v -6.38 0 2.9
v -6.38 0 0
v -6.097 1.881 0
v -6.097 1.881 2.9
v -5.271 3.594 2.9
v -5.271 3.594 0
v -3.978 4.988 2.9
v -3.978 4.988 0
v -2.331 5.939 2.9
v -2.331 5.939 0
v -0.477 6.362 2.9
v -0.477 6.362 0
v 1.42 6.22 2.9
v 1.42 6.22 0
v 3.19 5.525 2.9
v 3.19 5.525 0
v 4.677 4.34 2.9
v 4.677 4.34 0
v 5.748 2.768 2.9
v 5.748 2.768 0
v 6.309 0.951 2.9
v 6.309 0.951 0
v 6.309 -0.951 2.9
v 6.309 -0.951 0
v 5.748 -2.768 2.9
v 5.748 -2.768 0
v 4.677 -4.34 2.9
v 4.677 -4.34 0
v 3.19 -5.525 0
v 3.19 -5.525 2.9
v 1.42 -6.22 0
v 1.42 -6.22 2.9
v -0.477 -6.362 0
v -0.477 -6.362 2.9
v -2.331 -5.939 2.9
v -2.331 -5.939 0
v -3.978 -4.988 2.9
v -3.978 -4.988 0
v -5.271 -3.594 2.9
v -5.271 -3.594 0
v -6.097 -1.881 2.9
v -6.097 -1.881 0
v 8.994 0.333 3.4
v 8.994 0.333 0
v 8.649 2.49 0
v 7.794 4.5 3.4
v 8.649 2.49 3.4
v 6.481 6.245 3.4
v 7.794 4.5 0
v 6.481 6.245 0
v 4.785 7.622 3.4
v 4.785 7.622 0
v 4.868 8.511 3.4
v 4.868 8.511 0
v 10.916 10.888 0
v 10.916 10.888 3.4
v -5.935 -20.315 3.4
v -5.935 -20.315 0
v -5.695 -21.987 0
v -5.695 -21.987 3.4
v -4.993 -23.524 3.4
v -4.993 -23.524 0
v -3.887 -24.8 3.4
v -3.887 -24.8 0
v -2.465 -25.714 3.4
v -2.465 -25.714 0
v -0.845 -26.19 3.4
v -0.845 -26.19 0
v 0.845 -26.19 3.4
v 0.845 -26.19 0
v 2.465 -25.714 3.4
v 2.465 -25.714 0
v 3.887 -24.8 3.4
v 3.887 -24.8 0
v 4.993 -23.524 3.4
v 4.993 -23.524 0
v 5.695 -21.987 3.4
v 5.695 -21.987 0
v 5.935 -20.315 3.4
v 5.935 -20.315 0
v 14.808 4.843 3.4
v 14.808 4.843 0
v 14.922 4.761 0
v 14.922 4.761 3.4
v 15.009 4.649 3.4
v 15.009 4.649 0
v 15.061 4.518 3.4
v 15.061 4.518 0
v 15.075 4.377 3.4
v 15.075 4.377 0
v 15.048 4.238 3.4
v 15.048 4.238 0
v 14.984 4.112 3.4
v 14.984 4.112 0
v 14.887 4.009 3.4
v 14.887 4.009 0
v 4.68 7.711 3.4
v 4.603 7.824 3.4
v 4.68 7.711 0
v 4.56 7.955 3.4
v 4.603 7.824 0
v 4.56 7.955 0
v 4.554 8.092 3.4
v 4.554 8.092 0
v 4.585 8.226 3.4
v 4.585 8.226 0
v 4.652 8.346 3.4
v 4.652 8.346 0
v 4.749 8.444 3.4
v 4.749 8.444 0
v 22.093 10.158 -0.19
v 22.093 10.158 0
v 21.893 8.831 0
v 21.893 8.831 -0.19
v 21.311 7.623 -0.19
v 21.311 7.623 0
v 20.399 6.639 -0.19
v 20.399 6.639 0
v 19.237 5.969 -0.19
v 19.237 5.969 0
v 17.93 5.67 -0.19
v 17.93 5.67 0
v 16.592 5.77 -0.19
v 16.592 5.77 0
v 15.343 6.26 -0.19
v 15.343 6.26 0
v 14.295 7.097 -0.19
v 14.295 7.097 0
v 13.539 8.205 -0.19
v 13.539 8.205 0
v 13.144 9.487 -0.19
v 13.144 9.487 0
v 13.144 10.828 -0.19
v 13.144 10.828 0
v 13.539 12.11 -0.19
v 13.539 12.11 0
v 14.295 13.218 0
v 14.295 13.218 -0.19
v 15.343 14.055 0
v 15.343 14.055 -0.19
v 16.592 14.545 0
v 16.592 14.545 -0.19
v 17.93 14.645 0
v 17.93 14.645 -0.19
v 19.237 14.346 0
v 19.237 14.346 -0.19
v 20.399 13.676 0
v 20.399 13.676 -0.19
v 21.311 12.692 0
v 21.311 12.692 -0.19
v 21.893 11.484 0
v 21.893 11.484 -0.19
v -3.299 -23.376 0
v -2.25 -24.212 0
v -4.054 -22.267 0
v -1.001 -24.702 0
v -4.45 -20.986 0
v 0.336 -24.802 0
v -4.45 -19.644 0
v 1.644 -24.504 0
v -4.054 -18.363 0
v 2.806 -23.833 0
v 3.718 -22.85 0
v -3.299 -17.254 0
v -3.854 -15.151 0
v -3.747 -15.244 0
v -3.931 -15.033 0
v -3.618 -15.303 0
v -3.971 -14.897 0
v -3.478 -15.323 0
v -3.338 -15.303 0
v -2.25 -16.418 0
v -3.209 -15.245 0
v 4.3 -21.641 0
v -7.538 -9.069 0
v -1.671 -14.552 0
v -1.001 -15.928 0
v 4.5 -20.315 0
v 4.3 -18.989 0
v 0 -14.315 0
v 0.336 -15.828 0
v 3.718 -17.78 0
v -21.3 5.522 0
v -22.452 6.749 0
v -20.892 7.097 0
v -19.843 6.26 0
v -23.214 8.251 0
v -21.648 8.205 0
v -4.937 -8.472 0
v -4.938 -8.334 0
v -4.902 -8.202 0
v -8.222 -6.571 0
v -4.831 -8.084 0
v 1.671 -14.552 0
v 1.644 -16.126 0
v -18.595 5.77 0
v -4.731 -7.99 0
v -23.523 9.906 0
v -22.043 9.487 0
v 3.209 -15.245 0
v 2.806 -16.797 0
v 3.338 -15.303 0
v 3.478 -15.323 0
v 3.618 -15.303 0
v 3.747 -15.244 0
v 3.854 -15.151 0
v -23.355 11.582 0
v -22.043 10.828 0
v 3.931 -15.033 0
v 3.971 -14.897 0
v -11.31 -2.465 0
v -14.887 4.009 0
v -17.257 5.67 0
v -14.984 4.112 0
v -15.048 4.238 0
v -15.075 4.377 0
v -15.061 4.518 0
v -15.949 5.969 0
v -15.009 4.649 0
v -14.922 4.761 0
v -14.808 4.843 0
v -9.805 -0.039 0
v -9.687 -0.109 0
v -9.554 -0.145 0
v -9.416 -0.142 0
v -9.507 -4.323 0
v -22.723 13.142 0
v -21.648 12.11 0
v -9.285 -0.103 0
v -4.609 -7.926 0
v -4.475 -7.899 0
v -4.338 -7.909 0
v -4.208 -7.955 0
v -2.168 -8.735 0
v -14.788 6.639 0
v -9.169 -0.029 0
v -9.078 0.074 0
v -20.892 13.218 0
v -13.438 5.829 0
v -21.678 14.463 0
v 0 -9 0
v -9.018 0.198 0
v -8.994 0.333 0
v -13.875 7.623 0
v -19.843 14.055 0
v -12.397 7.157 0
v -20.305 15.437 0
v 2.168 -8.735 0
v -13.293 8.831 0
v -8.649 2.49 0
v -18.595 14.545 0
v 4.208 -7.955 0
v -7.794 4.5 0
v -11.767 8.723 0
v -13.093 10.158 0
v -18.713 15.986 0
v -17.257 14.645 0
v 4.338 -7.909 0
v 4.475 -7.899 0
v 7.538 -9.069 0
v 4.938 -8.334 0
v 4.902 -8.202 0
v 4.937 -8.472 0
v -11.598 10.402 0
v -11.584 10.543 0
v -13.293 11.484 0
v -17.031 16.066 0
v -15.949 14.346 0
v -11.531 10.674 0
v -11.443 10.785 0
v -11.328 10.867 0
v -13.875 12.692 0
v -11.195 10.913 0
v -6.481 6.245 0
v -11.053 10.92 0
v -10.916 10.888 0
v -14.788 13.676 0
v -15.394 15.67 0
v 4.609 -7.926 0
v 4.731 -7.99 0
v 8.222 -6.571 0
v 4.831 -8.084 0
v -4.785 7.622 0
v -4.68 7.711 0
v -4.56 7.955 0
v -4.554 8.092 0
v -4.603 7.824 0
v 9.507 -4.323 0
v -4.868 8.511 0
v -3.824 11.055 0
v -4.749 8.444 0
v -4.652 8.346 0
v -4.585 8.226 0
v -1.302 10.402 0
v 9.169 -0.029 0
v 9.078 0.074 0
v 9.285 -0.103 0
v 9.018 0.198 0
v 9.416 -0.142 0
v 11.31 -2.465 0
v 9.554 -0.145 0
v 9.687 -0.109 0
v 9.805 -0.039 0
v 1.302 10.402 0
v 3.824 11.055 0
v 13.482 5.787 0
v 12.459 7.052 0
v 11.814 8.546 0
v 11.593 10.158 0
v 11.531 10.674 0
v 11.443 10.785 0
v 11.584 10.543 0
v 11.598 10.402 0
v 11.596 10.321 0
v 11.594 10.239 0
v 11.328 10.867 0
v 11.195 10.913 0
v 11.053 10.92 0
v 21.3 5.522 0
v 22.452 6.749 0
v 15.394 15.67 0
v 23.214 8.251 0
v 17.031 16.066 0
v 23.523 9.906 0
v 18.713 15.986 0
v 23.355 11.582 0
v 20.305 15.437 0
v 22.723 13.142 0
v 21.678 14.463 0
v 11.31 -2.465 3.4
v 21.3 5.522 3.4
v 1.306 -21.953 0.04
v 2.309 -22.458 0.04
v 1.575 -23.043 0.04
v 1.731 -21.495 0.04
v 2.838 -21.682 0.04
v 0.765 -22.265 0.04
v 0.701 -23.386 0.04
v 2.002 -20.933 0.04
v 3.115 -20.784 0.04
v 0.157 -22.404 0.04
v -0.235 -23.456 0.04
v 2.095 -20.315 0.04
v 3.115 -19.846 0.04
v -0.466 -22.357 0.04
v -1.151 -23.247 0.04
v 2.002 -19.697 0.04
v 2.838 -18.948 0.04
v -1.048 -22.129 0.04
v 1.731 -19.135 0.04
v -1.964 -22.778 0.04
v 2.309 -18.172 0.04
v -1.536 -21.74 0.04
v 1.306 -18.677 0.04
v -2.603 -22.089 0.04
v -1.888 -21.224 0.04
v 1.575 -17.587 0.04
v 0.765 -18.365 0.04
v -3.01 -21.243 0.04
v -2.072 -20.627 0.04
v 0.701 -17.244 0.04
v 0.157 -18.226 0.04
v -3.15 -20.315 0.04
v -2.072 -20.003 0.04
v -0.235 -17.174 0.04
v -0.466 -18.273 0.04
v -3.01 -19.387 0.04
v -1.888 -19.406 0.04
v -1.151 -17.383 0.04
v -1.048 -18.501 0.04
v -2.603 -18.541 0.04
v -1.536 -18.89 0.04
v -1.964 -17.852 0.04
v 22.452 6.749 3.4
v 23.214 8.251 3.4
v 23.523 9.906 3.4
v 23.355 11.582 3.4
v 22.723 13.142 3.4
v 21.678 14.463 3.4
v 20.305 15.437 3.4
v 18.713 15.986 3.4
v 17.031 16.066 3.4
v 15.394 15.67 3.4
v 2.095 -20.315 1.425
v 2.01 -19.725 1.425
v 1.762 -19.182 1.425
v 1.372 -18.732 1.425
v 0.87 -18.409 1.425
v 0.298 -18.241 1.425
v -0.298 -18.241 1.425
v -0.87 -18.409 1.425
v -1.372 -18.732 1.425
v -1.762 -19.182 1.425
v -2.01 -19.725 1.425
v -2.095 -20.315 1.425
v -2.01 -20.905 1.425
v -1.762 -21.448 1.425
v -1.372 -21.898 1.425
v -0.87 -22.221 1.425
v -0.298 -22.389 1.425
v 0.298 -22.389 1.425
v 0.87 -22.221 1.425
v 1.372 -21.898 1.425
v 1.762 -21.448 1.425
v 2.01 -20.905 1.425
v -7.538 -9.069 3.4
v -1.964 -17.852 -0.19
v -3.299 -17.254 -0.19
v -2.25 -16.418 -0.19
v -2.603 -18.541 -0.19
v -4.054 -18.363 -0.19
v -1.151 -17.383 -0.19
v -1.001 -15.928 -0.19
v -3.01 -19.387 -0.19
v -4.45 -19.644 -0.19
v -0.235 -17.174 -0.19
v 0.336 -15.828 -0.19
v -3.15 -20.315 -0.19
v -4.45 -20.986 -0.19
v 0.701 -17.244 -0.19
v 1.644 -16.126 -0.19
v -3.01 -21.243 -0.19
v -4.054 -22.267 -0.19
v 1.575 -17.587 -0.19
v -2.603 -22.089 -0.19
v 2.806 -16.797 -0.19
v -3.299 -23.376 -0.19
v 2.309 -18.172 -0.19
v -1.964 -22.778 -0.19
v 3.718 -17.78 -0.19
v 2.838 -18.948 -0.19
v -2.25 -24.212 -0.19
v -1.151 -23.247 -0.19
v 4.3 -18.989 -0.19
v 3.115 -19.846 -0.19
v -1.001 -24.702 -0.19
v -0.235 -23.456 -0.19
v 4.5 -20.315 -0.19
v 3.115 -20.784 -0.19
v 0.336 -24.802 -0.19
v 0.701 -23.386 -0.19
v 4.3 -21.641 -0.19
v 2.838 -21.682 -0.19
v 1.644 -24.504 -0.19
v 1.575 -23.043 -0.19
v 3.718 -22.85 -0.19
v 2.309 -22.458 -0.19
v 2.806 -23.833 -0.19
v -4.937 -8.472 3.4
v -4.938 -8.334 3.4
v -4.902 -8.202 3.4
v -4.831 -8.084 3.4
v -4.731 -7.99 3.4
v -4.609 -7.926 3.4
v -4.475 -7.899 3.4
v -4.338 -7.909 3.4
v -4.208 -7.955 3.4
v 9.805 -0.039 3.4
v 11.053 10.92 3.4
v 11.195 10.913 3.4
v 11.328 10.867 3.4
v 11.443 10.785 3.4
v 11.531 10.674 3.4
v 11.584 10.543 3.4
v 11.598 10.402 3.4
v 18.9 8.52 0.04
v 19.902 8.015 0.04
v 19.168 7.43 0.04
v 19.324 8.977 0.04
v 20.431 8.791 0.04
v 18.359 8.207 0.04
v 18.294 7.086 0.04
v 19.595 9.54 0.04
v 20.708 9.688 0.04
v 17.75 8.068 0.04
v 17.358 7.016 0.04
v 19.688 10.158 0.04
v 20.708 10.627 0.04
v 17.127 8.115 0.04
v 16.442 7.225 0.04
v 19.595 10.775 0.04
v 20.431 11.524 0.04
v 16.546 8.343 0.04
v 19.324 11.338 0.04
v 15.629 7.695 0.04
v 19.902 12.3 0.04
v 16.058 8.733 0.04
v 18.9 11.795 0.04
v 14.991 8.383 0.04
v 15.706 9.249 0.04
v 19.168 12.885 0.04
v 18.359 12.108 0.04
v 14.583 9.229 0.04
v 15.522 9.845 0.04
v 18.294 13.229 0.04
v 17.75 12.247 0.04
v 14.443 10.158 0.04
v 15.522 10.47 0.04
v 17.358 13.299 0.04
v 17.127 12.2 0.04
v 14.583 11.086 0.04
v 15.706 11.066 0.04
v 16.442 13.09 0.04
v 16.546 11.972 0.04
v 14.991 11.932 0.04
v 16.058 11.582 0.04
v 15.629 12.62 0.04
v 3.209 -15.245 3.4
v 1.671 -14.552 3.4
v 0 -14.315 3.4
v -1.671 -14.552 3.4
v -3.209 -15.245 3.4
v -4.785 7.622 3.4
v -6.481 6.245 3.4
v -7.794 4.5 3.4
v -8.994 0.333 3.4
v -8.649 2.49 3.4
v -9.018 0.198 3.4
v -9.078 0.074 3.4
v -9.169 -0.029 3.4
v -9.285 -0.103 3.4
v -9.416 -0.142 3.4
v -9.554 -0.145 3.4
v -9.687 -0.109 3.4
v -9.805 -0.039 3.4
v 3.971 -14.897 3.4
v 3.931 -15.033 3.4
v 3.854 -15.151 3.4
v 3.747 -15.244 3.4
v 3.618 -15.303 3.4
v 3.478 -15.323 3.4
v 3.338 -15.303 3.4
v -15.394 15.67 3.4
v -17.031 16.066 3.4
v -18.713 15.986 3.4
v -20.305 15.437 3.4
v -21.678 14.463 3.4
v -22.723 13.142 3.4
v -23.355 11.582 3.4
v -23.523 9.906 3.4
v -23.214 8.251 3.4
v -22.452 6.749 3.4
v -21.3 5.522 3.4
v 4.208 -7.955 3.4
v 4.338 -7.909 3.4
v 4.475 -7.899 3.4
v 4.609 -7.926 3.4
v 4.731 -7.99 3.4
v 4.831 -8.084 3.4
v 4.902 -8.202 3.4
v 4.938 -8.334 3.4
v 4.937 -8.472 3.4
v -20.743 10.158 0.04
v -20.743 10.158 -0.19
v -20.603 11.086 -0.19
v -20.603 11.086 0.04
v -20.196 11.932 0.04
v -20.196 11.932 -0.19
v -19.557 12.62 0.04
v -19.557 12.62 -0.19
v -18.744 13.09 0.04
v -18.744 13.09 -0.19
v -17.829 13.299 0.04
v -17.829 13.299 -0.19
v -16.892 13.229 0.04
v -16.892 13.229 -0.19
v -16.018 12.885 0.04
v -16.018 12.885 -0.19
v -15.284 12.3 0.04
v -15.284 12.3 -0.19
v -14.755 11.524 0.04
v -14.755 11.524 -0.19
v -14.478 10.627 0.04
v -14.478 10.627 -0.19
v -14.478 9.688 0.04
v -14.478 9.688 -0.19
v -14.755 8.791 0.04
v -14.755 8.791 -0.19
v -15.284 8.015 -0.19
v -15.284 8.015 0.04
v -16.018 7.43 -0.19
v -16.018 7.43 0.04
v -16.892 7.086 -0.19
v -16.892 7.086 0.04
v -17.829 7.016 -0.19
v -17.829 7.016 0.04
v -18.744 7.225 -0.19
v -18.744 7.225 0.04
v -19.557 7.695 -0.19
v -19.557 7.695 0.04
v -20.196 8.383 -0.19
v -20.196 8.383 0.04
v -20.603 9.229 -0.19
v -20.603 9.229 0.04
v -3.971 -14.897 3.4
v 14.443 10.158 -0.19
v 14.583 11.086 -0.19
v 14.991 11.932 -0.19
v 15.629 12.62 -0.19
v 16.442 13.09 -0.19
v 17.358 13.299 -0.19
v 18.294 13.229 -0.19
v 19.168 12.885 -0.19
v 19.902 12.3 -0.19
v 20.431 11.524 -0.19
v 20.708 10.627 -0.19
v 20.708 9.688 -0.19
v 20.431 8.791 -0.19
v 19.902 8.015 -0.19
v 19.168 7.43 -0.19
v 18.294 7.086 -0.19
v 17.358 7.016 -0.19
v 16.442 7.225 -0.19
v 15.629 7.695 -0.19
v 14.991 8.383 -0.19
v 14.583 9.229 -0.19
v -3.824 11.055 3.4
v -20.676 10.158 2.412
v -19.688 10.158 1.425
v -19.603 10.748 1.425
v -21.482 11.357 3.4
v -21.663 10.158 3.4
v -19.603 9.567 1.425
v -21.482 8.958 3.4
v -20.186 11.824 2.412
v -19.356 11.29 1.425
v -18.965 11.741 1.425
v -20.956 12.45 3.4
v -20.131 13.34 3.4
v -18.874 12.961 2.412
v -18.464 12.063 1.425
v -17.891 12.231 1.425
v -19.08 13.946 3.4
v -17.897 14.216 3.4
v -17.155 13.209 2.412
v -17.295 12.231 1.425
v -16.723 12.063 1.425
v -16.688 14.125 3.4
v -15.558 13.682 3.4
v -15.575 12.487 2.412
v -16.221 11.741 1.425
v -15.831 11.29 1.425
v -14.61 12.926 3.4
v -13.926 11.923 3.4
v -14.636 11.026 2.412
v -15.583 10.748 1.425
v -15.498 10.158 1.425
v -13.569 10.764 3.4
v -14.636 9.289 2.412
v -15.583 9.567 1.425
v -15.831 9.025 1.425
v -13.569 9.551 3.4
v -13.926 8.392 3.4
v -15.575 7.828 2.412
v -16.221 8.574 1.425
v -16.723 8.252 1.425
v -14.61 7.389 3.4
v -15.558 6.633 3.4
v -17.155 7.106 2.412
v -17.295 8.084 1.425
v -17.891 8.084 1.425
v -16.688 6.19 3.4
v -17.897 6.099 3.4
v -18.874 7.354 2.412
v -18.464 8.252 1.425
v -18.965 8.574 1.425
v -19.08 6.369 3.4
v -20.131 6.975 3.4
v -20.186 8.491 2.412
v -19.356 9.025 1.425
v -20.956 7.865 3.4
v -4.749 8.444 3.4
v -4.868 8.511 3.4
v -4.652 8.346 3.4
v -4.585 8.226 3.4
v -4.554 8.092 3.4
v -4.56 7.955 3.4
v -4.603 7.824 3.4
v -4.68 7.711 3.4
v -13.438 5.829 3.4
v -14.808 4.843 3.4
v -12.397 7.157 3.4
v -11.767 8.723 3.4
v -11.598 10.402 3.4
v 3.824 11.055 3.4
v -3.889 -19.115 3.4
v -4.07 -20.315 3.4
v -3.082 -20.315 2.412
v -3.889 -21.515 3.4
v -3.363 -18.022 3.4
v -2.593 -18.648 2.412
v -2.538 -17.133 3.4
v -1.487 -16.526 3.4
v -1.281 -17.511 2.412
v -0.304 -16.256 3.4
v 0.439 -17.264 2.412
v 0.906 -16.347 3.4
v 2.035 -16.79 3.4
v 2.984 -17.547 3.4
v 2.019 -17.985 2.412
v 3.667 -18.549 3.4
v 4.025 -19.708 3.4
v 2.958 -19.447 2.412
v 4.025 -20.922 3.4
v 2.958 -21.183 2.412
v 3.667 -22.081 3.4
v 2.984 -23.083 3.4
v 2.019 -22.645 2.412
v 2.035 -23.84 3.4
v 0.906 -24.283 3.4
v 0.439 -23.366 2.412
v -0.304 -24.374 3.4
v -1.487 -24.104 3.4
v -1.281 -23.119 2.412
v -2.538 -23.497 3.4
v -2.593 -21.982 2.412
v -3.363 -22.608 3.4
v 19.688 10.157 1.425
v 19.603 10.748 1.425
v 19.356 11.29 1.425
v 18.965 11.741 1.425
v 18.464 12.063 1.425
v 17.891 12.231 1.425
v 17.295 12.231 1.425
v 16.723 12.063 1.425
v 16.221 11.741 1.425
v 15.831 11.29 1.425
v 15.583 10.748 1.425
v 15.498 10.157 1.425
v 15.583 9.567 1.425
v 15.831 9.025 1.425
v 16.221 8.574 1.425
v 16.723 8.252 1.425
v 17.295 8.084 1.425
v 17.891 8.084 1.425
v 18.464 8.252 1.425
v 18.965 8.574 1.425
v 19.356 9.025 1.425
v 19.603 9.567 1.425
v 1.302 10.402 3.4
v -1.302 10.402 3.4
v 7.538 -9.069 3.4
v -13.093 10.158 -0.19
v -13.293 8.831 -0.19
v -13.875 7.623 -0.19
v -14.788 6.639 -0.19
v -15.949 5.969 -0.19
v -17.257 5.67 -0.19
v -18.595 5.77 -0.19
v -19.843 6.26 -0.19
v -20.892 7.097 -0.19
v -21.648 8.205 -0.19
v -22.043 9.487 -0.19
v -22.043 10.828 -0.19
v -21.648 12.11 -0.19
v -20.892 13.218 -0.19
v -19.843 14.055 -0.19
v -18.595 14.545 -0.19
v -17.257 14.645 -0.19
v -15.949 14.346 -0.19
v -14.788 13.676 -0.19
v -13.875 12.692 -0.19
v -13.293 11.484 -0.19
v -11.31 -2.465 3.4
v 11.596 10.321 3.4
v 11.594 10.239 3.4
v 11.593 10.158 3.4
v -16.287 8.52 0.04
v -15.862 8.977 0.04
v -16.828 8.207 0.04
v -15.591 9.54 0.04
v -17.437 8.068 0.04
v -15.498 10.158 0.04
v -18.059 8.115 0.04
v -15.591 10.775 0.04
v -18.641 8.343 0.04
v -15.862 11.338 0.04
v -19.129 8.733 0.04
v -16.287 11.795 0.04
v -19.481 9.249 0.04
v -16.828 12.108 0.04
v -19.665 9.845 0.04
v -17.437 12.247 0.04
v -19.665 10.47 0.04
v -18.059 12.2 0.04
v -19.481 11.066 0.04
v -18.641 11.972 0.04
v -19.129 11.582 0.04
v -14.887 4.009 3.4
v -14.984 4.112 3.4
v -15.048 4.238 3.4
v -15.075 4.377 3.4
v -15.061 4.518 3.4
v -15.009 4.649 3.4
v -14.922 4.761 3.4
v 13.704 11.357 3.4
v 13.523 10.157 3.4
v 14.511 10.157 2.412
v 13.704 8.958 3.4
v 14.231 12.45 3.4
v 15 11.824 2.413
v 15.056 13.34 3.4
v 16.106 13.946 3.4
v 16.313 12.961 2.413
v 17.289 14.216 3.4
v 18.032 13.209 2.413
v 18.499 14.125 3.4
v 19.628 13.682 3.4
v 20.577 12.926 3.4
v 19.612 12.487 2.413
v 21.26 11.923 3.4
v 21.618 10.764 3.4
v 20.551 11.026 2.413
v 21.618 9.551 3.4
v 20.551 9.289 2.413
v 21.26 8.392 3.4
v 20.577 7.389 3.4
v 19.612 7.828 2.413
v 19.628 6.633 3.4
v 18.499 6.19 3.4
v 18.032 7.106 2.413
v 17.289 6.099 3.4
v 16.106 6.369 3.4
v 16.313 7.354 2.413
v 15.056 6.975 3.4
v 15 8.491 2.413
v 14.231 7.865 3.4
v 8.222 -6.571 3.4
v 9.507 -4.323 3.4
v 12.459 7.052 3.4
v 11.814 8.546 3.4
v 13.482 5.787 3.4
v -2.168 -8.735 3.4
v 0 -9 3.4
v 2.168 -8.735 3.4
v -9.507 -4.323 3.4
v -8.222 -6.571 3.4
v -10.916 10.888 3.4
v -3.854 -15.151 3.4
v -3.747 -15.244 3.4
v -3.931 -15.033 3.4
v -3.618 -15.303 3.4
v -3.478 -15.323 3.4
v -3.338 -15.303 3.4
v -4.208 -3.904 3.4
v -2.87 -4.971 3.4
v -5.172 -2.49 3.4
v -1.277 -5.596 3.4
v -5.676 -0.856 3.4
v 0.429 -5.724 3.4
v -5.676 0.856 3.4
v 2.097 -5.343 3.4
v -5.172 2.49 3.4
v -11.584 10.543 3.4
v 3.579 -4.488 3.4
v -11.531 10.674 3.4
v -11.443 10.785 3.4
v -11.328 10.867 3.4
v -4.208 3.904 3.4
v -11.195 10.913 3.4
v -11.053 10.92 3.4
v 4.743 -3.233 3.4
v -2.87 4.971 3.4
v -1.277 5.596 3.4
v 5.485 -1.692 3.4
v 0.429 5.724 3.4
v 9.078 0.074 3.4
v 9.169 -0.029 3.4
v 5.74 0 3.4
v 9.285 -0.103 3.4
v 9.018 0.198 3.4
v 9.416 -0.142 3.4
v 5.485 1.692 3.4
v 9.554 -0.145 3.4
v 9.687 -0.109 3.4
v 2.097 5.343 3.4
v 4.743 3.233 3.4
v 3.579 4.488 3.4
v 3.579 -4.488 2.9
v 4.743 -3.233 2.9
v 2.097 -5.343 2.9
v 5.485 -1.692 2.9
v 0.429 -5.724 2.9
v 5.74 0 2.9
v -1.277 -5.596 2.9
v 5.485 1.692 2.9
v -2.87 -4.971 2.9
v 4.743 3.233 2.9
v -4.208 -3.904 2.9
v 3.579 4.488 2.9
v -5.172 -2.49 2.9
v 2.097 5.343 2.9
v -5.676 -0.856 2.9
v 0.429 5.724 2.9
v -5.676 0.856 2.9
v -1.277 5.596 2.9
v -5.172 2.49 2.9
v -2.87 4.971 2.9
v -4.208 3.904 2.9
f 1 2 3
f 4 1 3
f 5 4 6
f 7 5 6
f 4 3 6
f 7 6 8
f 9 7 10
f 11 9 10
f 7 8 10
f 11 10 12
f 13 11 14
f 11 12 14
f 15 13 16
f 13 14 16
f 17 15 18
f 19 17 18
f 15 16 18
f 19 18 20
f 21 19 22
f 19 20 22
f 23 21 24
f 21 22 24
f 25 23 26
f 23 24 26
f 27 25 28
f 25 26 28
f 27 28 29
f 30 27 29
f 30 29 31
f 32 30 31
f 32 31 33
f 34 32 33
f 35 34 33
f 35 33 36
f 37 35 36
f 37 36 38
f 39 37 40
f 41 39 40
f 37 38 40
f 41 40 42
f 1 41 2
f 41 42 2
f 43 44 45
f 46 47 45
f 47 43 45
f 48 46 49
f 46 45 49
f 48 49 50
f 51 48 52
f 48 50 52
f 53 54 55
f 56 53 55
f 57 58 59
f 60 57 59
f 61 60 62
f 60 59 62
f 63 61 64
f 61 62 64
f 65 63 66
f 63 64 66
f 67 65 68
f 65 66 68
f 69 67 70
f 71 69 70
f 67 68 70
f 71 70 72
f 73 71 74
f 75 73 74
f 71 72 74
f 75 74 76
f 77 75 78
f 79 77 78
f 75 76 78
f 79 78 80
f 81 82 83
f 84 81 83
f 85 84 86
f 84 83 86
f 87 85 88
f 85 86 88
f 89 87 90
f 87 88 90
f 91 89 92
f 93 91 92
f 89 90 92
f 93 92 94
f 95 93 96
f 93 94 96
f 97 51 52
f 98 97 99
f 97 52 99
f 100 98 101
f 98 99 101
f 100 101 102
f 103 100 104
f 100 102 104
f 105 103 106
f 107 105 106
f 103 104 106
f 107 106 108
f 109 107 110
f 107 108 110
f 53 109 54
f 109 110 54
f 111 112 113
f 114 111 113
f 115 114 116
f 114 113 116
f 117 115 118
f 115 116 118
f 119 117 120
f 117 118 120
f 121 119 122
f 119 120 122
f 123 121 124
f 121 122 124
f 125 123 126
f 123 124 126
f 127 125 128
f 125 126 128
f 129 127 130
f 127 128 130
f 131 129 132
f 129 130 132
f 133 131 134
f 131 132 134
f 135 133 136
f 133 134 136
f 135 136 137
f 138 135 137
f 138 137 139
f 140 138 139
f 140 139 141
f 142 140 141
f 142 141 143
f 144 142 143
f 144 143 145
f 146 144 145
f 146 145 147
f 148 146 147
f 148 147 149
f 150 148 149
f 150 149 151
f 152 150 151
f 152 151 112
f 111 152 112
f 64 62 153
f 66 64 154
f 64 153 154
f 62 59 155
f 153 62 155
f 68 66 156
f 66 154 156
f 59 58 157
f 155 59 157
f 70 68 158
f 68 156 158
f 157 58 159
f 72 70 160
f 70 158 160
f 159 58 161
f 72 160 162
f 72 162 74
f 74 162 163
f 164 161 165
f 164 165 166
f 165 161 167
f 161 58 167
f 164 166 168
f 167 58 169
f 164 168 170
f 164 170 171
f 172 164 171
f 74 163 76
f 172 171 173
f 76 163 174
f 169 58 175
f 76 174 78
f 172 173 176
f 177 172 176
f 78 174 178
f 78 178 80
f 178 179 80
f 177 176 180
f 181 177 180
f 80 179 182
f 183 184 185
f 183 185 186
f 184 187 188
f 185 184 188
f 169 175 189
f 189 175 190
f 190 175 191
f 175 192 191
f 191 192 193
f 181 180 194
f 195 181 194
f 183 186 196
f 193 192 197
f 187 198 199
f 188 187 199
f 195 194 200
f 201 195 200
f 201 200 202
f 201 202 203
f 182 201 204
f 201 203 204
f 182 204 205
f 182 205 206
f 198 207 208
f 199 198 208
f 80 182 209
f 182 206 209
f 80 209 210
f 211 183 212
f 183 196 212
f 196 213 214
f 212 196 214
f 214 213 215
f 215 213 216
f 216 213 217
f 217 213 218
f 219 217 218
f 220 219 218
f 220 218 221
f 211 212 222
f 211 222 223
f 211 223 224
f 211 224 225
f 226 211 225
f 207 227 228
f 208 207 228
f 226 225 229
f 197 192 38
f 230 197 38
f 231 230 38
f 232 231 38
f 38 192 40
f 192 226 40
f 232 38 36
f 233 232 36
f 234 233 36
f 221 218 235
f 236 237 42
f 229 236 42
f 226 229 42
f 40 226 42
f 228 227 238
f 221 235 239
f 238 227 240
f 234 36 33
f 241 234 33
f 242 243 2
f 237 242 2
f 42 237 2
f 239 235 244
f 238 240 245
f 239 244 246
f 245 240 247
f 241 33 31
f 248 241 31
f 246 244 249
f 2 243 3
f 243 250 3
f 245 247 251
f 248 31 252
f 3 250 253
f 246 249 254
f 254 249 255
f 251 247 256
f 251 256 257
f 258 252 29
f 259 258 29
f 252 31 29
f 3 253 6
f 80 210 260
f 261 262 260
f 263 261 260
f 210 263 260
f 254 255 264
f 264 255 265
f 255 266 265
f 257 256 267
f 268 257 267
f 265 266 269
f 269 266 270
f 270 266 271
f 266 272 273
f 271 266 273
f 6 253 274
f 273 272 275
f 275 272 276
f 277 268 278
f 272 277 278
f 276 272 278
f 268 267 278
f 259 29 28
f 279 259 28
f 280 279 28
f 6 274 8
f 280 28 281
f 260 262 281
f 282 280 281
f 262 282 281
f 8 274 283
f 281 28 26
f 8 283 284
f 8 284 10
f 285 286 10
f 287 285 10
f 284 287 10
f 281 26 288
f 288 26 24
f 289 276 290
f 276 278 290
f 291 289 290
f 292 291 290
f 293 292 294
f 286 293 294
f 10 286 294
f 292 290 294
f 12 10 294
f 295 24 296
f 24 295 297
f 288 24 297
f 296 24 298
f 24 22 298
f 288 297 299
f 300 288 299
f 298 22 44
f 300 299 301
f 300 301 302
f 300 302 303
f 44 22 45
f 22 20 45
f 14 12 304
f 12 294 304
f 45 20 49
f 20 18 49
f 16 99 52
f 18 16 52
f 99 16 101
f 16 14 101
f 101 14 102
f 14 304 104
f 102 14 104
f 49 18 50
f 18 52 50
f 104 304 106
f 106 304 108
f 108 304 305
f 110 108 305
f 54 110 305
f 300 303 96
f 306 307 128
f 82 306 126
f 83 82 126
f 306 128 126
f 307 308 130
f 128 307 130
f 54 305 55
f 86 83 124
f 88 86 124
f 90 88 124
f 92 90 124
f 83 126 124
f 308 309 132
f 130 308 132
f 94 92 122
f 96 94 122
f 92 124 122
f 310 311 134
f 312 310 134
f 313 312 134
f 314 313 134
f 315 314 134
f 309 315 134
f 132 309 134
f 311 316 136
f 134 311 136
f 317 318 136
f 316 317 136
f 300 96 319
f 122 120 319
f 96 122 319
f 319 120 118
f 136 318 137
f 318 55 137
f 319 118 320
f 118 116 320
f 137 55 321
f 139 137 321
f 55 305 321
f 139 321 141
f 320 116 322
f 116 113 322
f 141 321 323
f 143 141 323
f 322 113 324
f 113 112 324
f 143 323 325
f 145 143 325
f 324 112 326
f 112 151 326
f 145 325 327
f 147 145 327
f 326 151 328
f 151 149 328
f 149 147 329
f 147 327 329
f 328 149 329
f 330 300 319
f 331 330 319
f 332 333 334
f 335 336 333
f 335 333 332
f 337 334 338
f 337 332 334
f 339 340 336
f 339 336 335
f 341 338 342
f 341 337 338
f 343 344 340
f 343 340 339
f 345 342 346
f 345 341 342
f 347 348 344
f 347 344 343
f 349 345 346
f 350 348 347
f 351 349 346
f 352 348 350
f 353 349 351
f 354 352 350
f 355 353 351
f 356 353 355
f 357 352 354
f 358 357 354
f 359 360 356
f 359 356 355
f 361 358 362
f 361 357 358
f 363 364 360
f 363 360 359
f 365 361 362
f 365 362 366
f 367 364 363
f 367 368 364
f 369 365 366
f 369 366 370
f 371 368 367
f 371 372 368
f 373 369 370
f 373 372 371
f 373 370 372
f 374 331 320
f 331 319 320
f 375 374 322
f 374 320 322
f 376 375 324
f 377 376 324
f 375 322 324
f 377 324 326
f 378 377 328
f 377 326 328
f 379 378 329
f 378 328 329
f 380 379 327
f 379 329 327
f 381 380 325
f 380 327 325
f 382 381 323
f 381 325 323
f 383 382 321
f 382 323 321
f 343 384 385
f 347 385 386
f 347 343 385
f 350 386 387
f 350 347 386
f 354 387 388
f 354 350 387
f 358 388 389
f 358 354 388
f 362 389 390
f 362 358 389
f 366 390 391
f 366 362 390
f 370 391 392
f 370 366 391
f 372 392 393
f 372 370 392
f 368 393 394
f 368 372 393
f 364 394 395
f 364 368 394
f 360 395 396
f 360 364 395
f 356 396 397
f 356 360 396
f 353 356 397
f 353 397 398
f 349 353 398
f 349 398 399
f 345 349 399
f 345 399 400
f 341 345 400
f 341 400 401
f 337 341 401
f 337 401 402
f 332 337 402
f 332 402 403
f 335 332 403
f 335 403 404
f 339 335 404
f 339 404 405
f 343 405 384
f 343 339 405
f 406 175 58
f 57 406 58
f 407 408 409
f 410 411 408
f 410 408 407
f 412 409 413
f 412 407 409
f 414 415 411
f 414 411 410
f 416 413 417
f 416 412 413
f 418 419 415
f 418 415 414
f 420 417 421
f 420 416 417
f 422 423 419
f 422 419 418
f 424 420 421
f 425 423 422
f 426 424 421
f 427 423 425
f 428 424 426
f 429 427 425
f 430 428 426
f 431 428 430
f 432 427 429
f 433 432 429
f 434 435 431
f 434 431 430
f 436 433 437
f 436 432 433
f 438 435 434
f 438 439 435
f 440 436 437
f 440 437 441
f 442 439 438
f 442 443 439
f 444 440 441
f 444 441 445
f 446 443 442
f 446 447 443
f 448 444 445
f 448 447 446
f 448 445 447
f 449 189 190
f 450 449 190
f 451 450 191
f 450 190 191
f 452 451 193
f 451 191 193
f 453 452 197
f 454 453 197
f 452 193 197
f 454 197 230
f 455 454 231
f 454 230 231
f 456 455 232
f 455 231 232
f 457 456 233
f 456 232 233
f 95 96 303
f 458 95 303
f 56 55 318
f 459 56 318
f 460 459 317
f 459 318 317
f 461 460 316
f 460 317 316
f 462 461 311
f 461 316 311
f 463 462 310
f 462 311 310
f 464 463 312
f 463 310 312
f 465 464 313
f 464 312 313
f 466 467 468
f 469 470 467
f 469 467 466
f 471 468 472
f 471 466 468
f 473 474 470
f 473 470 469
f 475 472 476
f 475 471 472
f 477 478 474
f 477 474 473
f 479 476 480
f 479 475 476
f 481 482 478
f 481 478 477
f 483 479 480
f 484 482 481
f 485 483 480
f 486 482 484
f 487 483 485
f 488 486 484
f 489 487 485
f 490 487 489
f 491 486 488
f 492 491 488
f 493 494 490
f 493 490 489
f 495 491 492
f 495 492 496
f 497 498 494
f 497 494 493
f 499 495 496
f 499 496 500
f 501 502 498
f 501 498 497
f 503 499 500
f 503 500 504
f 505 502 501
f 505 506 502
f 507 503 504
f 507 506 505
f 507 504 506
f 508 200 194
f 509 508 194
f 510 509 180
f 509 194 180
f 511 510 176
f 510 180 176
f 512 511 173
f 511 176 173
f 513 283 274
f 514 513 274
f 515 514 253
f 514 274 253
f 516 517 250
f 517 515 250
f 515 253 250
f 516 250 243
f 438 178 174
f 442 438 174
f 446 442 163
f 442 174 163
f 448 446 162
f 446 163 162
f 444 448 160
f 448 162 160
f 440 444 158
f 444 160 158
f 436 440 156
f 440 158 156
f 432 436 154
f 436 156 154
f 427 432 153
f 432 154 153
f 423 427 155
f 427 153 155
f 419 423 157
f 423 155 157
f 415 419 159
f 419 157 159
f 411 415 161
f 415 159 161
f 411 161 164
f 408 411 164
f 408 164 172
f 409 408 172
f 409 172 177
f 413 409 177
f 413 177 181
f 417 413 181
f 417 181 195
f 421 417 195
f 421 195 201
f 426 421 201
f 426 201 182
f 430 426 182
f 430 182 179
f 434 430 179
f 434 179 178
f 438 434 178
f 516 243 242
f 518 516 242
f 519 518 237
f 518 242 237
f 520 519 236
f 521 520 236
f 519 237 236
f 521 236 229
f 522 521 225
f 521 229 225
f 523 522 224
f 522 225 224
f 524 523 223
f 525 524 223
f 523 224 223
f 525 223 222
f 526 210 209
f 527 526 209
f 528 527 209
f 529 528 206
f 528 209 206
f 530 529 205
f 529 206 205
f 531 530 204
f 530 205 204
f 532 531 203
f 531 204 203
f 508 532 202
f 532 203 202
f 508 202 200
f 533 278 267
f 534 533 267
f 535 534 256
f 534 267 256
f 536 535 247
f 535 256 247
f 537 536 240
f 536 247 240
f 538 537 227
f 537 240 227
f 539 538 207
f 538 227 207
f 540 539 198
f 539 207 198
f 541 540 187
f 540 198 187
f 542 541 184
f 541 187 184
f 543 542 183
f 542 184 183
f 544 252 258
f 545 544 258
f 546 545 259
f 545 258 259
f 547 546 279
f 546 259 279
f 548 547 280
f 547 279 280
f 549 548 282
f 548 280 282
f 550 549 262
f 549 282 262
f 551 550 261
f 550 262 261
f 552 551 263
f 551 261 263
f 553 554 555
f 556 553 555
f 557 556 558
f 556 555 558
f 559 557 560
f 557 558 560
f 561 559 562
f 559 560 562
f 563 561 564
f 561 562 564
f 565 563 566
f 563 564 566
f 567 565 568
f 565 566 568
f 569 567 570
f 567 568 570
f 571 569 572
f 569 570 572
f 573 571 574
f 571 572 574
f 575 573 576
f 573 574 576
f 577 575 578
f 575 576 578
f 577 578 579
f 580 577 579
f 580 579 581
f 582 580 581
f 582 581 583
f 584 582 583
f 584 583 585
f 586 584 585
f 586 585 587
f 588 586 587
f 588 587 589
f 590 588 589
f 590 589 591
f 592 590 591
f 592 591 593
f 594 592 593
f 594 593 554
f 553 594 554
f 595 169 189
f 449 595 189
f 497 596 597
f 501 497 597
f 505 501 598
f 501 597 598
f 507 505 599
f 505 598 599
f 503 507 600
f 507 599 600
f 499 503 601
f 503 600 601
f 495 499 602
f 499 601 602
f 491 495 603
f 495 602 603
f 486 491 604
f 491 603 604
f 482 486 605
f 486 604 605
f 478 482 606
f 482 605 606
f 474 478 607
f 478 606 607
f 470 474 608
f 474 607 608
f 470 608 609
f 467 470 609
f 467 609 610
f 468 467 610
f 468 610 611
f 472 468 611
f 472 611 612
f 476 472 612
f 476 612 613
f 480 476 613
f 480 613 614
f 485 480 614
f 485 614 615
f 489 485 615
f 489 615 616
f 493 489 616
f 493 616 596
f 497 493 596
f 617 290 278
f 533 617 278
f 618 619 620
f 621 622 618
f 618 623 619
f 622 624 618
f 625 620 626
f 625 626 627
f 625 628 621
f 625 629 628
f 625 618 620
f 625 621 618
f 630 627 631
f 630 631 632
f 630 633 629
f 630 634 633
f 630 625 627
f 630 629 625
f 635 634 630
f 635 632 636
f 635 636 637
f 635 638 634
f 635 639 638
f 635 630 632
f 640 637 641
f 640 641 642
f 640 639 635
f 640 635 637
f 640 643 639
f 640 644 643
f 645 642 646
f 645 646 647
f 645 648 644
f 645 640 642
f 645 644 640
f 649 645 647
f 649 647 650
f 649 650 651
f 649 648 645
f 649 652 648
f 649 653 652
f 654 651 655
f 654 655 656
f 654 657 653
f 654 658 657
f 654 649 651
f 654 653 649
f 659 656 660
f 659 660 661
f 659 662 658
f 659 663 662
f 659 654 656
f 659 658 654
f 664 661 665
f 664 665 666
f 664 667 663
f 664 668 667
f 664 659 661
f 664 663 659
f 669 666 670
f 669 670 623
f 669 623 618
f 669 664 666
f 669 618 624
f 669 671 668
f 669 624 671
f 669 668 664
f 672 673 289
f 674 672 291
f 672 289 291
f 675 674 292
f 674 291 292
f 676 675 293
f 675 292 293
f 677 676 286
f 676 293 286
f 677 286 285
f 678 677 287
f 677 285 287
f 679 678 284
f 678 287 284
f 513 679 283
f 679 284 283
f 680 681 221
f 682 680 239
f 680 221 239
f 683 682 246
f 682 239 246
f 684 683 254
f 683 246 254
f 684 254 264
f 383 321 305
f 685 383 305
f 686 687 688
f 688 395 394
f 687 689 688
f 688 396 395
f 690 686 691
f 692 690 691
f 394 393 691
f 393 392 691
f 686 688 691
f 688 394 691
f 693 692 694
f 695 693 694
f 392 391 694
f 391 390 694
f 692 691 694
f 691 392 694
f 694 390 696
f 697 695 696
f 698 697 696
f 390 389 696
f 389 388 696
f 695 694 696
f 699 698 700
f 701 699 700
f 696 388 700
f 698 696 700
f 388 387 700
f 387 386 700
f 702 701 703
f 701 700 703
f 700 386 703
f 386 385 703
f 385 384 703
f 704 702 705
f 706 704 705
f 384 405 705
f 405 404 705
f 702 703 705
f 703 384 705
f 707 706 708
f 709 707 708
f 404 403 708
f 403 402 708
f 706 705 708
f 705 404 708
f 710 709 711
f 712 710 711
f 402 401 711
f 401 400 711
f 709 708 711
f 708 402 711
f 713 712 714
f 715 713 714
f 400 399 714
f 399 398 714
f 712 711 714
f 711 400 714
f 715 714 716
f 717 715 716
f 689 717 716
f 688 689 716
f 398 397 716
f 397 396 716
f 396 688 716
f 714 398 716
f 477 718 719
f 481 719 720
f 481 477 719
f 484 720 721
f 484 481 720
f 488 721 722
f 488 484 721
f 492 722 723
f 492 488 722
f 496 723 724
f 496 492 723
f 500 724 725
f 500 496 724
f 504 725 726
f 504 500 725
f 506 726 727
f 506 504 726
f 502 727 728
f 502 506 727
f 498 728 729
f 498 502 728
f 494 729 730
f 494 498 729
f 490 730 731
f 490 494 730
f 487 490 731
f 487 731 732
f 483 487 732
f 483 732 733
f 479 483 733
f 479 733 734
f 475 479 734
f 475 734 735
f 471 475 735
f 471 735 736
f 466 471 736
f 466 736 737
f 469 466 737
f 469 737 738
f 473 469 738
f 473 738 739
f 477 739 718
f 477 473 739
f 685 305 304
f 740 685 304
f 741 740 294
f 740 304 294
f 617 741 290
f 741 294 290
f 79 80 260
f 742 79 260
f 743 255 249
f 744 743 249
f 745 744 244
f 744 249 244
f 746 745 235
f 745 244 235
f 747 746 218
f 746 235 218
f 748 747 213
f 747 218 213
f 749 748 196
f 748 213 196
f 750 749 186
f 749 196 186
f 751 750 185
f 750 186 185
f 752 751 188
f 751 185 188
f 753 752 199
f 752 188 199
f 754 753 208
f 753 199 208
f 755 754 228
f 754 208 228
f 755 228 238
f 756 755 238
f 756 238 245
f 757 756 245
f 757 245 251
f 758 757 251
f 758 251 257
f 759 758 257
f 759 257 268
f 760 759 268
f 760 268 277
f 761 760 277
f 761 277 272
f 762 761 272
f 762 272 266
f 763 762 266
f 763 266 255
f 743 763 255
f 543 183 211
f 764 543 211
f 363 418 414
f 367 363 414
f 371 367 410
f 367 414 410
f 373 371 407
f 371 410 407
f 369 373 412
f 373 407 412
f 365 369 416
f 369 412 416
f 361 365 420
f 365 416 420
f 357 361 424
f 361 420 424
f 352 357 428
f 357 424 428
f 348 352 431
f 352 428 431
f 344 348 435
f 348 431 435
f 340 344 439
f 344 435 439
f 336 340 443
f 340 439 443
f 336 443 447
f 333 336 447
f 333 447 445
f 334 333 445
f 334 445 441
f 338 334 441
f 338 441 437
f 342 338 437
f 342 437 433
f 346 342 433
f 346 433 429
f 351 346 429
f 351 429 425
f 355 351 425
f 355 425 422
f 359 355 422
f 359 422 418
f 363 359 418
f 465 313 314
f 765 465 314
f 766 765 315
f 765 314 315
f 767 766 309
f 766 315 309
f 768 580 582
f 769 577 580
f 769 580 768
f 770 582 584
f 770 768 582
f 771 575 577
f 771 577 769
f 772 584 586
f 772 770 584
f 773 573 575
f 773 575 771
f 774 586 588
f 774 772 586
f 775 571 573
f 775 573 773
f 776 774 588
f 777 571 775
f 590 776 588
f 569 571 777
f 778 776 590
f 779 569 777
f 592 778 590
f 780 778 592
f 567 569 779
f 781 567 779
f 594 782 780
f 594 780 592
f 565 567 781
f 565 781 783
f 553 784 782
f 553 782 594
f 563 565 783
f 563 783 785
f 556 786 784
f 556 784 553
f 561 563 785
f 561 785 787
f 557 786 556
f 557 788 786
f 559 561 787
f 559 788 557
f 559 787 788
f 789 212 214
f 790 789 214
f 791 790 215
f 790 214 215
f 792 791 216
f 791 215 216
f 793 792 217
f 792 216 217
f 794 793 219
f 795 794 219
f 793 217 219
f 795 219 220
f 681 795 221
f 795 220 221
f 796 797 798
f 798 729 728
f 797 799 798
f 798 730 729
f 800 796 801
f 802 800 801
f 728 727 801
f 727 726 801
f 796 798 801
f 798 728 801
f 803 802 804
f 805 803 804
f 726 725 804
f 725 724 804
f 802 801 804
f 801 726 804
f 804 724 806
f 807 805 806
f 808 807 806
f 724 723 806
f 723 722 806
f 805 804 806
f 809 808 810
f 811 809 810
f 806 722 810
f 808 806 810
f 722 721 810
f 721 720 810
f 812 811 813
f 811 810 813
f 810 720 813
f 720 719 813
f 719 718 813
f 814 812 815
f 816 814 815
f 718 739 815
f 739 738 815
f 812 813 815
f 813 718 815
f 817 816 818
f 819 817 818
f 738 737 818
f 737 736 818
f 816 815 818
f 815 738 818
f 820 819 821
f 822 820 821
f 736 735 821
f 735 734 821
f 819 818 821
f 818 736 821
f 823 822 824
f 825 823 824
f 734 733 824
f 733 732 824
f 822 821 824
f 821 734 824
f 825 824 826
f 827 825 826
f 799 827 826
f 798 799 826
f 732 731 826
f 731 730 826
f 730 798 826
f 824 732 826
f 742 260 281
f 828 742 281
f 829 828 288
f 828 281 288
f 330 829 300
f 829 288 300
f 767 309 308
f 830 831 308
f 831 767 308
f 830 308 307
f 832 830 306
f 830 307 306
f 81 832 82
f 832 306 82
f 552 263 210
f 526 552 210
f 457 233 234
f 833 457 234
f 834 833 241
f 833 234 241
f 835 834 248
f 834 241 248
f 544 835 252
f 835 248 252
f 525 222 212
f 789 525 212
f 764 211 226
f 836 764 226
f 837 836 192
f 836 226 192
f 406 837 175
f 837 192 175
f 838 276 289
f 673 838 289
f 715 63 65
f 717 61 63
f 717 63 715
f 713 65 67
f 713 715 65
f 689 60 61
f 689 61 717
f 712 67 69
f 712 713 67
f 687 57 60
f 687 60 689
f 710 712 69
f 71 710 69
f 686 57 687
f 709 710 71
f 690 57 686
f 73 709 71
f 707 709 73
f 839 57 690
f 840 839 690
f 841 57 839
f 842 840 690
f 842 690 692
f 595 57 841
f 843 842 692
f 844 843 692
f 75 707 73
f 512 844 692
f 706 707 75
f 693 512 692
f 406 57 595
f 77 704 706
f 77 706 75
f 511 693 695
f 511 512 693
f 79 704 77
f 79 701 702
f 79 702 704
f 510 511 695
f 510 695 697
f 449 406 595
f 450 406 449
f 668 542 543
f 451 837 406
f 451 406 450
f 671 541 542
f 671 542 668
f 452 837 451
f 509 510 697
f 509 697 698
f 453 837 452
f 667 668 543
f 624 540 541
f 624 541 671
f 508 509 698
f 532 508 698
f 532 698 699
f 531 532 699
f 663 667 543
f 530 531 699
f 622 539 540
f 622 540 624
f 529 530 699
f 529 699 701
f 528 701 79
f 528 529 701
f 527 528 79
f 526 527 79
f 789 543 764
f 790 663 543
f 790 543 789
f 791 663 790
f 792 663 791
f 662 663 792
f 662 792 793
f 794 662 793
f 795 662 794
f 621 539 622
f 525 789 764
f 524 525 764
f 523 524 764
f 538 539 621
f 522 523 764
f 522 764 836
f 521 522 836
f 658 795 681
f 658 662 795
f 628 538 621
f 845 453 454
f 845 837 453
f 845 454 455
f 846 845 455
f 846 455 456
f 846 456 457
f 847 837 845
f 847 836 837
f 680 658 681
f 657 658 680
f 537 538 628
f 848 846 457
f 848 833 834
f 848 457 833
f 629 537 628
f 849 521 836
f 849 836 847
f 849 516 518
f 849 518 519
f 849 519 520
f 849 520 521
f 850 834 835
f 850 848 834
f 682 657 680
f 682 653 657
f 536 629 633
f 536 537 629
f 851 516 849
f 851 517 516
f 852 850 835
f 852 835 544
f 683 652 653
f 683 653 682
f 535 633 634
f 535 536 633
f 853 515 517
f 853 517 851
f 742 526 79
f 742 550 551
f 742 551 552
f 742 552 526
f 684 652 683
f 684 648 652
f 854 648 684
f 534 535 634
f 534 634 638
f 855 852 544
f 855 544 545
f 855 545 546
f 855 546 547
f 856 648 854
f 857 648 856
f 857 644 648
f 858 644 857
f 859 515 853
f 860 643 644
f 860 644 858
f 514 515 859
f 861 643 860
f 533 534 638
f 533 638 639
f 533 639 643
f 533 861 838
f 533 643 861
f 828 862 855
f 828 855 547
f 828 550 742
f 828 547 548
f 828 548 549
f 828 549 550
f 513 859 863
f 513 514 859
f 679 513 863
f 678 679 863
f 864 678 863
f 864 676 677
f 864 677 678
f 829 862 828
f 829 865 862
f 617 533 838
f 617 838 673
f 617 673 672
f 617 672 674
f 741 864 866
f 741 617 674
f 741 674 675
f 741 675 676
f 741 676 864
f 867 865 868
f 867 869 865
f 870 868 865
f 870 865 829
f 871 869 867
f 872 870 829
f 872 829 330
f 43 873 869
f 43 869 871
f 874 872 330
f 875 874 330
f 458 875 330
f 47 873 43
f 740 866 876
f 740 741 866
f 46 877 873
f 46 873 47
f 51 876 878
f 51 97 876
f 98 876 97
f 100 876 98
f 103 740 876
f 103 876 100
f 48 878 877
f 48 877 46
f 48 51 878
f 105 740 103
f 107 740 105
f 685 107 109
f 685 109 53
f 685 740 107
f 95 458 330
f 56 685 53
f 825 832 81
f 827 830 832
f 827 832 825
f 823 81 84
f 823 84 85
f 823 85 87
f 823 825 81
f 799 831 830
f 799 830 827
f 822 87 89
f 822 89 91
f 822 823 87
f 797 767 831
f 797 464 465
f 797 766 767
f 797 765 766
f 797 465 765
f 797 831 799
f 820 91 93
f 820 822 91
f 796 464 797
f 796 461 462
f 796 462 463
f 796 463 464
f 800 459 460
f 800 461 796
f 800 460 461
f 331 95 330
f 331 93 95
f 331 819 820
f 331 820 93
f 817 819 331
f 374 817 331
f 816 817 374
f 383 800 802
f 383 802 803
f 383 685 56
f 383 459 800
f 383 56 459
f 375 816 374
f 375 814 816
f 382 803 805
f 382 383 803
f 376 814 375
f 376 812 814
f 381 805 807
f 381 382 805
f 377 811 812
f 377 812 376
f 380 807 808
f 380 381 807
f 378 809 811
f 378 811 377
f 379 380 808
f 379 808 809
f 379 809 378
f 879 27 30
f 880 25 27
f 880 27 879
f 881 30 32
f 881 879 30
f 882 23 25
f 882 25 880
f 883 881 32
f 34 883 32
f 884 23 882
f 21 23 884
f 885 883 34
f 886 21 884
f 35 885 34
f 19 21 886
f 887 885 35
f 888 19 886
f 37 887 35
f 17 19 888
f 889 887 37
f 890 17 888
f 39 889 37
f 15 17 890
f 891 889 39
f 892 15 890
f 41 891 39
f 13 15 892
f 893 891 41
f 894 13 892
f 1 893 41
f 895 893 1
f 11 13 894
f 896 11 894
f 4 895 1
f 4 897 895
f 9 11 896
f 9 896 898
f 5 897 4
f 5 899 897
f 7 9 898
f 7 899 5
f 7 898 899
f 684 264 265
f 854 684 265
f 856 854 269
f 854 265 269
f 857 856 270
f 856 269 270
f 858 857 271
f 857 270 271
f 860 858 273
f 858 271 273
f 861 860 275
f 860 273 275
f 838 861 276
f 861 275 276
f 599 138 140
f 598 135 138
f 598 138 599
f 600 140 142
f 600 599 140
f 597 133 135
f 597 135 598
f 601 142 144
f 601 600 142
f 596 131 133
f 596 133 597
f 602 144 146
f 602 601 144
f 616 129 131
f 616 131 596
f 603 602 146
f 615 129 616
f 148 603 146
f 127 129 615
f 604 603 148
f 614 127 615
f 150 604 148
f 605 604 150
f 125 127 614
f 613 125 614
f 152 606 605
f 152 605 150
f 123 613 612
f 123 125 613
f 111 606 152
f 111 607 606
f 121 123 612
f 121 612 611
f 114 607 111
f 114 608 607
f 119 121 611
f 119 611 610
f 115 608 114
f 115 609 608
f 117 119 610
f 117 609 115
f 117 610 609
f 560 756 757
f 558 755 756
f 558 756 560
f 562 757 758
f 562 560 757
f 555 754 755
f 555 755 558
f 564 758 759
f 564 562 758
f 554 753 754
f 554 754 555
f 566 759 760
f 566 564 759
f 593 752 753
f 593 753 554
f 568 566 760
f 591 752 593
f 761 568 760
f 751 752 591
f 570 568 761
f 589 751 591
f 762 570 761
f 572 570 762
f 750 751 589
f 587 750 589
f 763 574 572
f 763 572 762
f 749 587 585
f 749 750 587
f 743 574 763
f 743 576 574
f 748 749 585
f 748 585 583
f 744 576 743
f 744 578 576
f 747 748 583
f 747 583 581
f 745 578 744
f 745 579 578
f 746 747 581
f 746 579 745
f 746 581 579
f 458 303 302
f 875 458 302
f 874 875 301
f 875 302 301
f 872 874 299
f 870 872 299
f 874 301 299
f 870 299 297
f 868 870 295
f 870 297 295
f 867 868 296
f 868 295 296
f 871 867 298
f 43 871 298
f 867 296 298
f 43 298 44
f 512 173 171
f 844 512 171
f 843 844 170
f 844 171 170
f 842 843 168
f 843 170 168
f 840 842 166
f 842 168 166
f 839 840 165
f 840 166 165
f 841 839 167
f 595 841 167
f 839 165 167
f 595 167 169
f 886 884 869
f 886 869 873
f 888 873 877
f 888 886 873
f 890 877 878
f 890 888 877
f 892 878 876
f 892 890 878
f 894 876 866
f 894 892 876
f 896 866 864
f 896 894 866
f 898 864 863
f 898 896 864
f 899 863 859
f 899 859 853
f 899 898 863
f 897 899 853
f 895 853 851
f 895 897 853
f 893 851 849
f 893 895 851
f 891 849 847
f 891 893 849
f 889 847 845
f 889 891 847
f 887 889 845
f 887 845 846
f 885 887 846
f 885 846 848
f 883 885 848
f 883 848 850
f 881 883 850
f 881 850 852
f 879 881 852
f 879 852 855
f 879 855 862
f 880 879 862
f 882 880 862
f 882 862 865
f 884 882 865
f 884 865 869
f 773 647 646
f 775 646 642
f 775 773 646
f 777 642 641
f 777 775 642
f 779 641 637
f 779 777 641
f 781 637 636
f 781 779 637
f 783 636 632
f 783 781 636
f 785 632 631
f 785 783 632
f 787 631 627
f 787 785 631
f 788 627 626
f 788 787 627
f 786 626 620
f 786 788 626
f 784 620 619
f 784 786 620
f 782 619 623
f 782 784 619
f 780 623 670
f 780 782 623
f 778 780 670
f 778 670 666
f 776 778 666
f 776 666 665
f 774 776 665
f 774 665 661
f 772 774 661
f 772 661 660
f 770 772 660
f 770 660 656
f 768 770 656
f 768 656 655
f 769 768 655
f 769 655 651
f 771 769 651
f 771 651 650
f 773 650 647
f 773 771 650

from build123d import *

# Parameters (mm, degrees)
SKETCH_1_R          = 5.935
SKETCH_1_R_2        = 2.095
SKETCH_1_R_3        = 5.74
EXTRUDE_1_DEPTH     = 3.4
SKETCH_3_R          = 6.38
CUT_EXTRUDE_1_DEPTH = 2.9
SKETCH_4_R          = 4.5
EXTRUDE_3_DEPTH     = 0.56
SKETCH_6_R          = 3.15
CUT_EXTRUDE_2_DEPTH = 0.6
SKETCH_7_R          = 3.15
CUT_EXTRUDE_3_DEPTH = 0.6
SKETCH_8_R          = 3.15
CUT_EXTRUDE_4_DEPTH = 0.6
CUT_EXTRUDE_5_DEPTH = 10
SKETCH_13_R         = 4.5
SKETCH_13_R_2       = 3.15
CUT_EXTRUDE_6_DEPTH = 0.37
SKETCH_14_R         = 4.5
SKETCH_14_R_2       = 3.15
CUT_EXTRUDE_7_DEPTH = 0.37
SKETCH_15_R         = 4.5
SKETCH_15_R_2       = 3.15
CUT_EXTRUDE_8_DEPTH = 0.37


with BuildPart() as part:
    # 草图1 → 凸台-拉伸1 (new body)
    # profile 1 of 4: a face of its own
    with BuildSketch(Plane.XY):
        with Locations((-17.593306078, 10.1575)):
            Circle(SKETCH_1_R)
        with Locations((-17.593306078, 10.1575)):
            Circle(SKETCH_1_R_2, mode=Mode.SUBTRACT)
    # profile 2 of 4: a face of its own
    with BuildSketch(Plane.XY):
        with Locations((17.593306078, 10.1575)):
            Circle(SKETCH_1_R)
        with Locations((17.593306078, 10.1575)):
            Circle(SKETCH_1_R_2, mode=Mode.SUBTRACT)
    # profile 3 of 4: a face of its own
    with BuildSketch(Plane.XY):
        with BuildLine():
            Line((-3.823709102, 11.054508427), (-15.39430283, 15.670086481))
            ThreePointArc((-15.39430283, 15.670086481), (-12.680297362, 13.487150186), (-11.658306078, 10.1575))
            ThreePointArc((-11.658306078, 10.1575), (-15.021547784, 4.808641778), (-21.299513922, 5.521958132))
            Line((-21.299513922, 5.521958132), (-11.31029049, -2.464624515))
            ThreePointArc((-11.31029049, -2.464624515), (-8.793601867, -5.406520994), (-7.538053442, -9.068770941))
            Line((-7.538053442, -9.068770941), (-5.935, -20.315))
            ThreePointArc((-5.935, -20.315), (0, -14.38), (5.935, -20.315))
            Line((5.935, -20.315), (7.538053442, -9.068770941))
            ThreePointArc((7.538053442, -9.068770941), (8.793601867, -5.406520994), (11.31029049, -2.464624515))
            Line((11.31029049, -2.464624515), (21.299513922, 5.521958132))
            ThreePointArc((21.299513922, 5.521958132), (12.46358448, 7.172507316), (15.39430283, 15.670086481))
            Line((15.39430283, 15.670086481), (3.823709102, 11.054508427))
            ThreePointArc((3.823709102, 11.054508427), (0, 10.32), (-3.823709102, 11.054508427))
        make_face()
        Circle(SKETCH_1_R_3, mode=Mode.SUBTRACT)
    # profile 4 of 4: a face of its own
    with BuildSketch(Plane.XY):
        with Locations((0, -20.315)):
            Circle(SKETCH_1_R)
        with Locations((0, -20.315)):
            Circle(SKETCH_1_R_2, mode=Mode.SUBTRACT)
    extrude(amount=EXTRUDE_1_DEPTH)

    # 草图3 → 切除-拉伸1 (cut)
    with BuildSketch(Plane(origin=(0, 0, 0), x_dir=(-1, 0, 0), z_dir=(0, 0, -1))):
        Circle(SKETCH_3_R)
    extrude(amount=-CUT_EXTRUDE_1_DEPTH, mode=Mode.SUBTRACT)

    # 草图4 → 凸台-拉伸3 (add)
    with BuildSketch(Plane(origin=(0, 0, 0), x_dir=(-1, 0, 0), z_dir=(0, 0, -1))):
        with Locations(Location((0, -20.315, 0), (0, 0, 180))):
            Circle(SKETCH_4_R)
        with Locations(Location((17.593306078, 10.1575, 0), (0, 0, 180))):
            Circle(SKETCH_4_R)
        with Locations(Location((-17.593306078, 10.1575, 0), (0, 0, 180))):
            Circle(SKETCH_4_R)
    extrude(amount=EXTRUDE_3_DEPTH)

    # 草图6 → 切除-拉伸2 (cut)
    with BuildSketch(Plane(origin=(0, 0, -0.56), x_dir=(-1, 0, 0), z_dir=(0, 0, -1))):
        with Locations((0, -20.315)):
            Circle(SKETCH_6_R)
    extrude(amount=-CUT_EXTRUDE_2_DEPTH, mode=Mode.SUBTRACT)

    # 草图7 → 切除-拉伸3 (cut)
    with BuildSketch(Plane(origin=(0, 0, -0.56), x_dir=(-1, 0, 0), z_dir=(0, 0, -1))):
        with Locations((-17.593306078, 10.1575)):
            Circle(SKETCH_7_R)
    extrude(amount=-CUT_EXTRUDE_3_DEPTH, mode=Mode.SUBTRACT)

    # 草图8 → 切除-拉伸4 (cut)
    with BuildSketch(Plane(origin=(0, 0, -0.56), x_dir=(-1, 0, 0), z_dir=(0, 0, -1))):
        with Locations((17.593306078, 10.1575)):
            Circle(SKETCH_8_R)
    extrude(amount=-CUT_EXTRUDE_4_DEPTH, mode=Mode.SUBTRACT)

    # 草图9 → 切除-旋转1 (revolve, cut)
    with BuildSketch(Plane(origin=(0, 10.1575, 0), x_dir=(-1, 0, 0), z_dir=(0, -1, 0))):
        Polygon((19.688306078, -3.4), (19.688306078, -1.425), (21.663306078, -3.4), align=None)
    revolve(axis=Axis((-17.593306078, 10.1575, 3.4), (0, 0, -1)), mode=Mode.SUBTRACT)

    # 草图10 → 切除-旋转2 (revolve, cut)
    with BuildSketch(Plane(origin=(8.796653039, -5.07875, 0), x_dir=(0, 0, 1), z_dir=(-0.8660254037844397, 0.49999999999999806, 0)), mode=Mode.PRIVATE) as cut_revolve_2_sk:
        Polygon((3.4, 19.688306078), (3.4, 21.663306078), (1.425, 19.688306078), align=None)
    revolve(cut_revolve_2_sk.sketch.rotate(Axis((17.593306078, 10.1575, 3.4), (0, 0, -1)), 240), axis=Axis((17.593306078, 10.1575, 3.4), (0, 0, -1)), mode=Mode.SUBTRACT)

    # 草图11 → 切除-旋转3 (revolve, cut)
    with BuildSketch(Plane(origin=(8.796653039, -5.07875, 0), x_dir=(0, 0, 1), z_dir=(-0.8660254037844397, 0.49999999999999806, 0)), mode=Mode.PRIVATE) as cut_revolve_3_sk:
        Polygon((3.4, -15.498306078), (3.4, -13.523306078), (1.425, -15.498306078), align=None)
    revolve(cut_revolve_3_sk.sketch.rotate(Axis((0, -20.315, 3.4), (0, 0, -1)), 240), axis=Axis((0, -20.315, 3.4), (0, 0, -1)), mode=Mode.SUBTRACT)

    # 草图12 → 切除-拉伸5 (cut)
    with BuildSketch(Plane(origin=(0, 0, 0), x_dir=(-1, 0, 0), z_dir=(0, 0, -1))):
        with BuildLine():
            Line((9.80504906, -0.039344726), (14.886999287, 4.00948902))
            ThreePointArc((14.886999287, 4.00948902), (15.07318502, 4.447954395), (14.80758098, 4.843392767))
            ThreePointArc((14.80758098, 4.843392767), (12.397153655, 7.1575), (11.598291667, 10.402044914))
            ThreePointArc((11.598291667, 10.402044914), (11.388634011, 10.829783946), (10.915818991, 10.887775059))
            Line((10.915818991, 10.887775059), (4.868450998, 8.511093935))
            ThreePointArc((4.868450998, 8.511093935), (4.553503625, 8.092216181), (4.785479185, 7.622282399))
            ThreePointArc((4.785479185, 7.622282399), (7.794228634, 4.5), (8.993829785, 0.333205344))
            ThreePointArc((8.993829785, 0.333205344), (9.284816598, -0.102658275), (9.80504906, -0.039344726))
        make_face()
        with BuildLine():
            Line((3.971180296, -14.897264079), (4.936598062, -8.471749209))
            ThreePointArc((4.936598062, -8.471749209), (4.731312973, -7.989557906), (4.2083506, -7.955487743))
            ThreePointArc((4.2083506, -7.955487743), (0, -9), (-4.2083506, -7.955487743))
            ThreePointArc((-4.2083506, -7.955487743), (-4.731312973, -7.989557906), (-4.936598062, -8.471749209))
            Line((-4.936598062, -8.471749209), (-3.971180296, -14.897264079))
            ThreePointArc((-3.971180296, -14.897264079), (-3.684551009, -15.277738341), (-3.209289313, -15.245437681))
            ThreePointArc((-3.209289313, -15.245437681), (0, -14.315), (3.209289313, -15.245437681))
            ThreePointArc((3.209289313, -15.245437681), (3.684551009, -15.277738341), (3.971180296, -14.897264079))
        make_face()
        with BuildLine():
            Line((-4.868450998, 8.511093935), (-10.915818991, 10.887775059))
            ThreePointArc((-10.915818991, 10.887775059), (-11.388634011, 10.829783946), (-11.598291667, 10.402044914))
            ThreePointArc((-11.598291667, 10.402044914), (-11.594552605, 10.279797865), (-11.593306078, 10.1575))
            ThreePointArc((-11.593306078, 10.1575), (-12.459382111, 7.052210206), (-14.80758098, 4.843392767))
            ThreePointArc((-14.80758098, 4.843392767), (-15.07318502, 4.447954395), (-14.886999287, 4.00948902))
            Line((-14.886999287, 4.00948902), (-9.80504906, -0.039344726))
            ThreePointArc((-9.80504906, -0.039344726), (-9.284816598, -0.102658275), (-8.993829785, 0.333205344))
            ThreePointArc((-8.993829785, 0.333205344), (-7.794228634, 4.5), (-4.785479185, 7.622282399))
            ThreePointArc((-4.785479185, 7.622282399), (-4.553503625, 8.092216181), (-4.868450998, 8.511093935))
        make_face()
    extrude(amount=-CUT_EXTRUDE_5_DEPTH, mode=Mode.SUBTRACT)

    # 草图13 → 切除-拉伸6 (cut)
    with BuildSketch(Plane(origin=(0, 0, -0.56), x_dir=(-1, 0, 0), z_dir=(0, 0, -1))):
        with Locations(Location((0, -20.315, 0), (0, 0, 180))):
            Circle(SKETCH_13_R)
        with Locations((0, -20.315)):
            Circle(SKETCH_13_R_2, mode=Mode.SUBTRACT)
    extrude(amount=-CUT_EXTRUDE_6_DEPTH, mode=Mode.SUBTRACT)

    # 草图14 → 切除-拉伸7 (cut)
    with BuildSketch(Plane(origin=(0, 0, -0.56), x_dir=(-1, 0, 0), z_dir=(0, 0, -1))):
        with Locations(Location((-17.593306078, 10.1575, 0), (0, 0, 180))):
            Circle(SKETCH_14_R)
        with Locations((-17.593306078, 10.1575)):
            Circle(SKETCH_14_R_2, mode=Mode.SUBTRACT)
    extrude(amount=-CUT_EXTRUDE_7_DEPTH, mode=Mode.SUBTRACT)

    # 草图15 → 切除-拉伸8 (cut)
    with BuildSketch(Plane(origin=(0, 0, -0.56), x_dir=(-1, 0, 0), z_dir=(0, 0, -1))):
        with Locations(Location((17.593306078, 10.1575, 0), (0, 0, 180))):
            Circle(SKETCH_15_R)
        with Locations((17.593306078, 10.1575)):
            Circle(SKETCH_15_R_2, mode=Mode.SUBTRACT)
    extrude(amount=-CUT_EXTRUDE_8_DEPTH, mode=Mode.SUBTRACT)


solid = part.part
